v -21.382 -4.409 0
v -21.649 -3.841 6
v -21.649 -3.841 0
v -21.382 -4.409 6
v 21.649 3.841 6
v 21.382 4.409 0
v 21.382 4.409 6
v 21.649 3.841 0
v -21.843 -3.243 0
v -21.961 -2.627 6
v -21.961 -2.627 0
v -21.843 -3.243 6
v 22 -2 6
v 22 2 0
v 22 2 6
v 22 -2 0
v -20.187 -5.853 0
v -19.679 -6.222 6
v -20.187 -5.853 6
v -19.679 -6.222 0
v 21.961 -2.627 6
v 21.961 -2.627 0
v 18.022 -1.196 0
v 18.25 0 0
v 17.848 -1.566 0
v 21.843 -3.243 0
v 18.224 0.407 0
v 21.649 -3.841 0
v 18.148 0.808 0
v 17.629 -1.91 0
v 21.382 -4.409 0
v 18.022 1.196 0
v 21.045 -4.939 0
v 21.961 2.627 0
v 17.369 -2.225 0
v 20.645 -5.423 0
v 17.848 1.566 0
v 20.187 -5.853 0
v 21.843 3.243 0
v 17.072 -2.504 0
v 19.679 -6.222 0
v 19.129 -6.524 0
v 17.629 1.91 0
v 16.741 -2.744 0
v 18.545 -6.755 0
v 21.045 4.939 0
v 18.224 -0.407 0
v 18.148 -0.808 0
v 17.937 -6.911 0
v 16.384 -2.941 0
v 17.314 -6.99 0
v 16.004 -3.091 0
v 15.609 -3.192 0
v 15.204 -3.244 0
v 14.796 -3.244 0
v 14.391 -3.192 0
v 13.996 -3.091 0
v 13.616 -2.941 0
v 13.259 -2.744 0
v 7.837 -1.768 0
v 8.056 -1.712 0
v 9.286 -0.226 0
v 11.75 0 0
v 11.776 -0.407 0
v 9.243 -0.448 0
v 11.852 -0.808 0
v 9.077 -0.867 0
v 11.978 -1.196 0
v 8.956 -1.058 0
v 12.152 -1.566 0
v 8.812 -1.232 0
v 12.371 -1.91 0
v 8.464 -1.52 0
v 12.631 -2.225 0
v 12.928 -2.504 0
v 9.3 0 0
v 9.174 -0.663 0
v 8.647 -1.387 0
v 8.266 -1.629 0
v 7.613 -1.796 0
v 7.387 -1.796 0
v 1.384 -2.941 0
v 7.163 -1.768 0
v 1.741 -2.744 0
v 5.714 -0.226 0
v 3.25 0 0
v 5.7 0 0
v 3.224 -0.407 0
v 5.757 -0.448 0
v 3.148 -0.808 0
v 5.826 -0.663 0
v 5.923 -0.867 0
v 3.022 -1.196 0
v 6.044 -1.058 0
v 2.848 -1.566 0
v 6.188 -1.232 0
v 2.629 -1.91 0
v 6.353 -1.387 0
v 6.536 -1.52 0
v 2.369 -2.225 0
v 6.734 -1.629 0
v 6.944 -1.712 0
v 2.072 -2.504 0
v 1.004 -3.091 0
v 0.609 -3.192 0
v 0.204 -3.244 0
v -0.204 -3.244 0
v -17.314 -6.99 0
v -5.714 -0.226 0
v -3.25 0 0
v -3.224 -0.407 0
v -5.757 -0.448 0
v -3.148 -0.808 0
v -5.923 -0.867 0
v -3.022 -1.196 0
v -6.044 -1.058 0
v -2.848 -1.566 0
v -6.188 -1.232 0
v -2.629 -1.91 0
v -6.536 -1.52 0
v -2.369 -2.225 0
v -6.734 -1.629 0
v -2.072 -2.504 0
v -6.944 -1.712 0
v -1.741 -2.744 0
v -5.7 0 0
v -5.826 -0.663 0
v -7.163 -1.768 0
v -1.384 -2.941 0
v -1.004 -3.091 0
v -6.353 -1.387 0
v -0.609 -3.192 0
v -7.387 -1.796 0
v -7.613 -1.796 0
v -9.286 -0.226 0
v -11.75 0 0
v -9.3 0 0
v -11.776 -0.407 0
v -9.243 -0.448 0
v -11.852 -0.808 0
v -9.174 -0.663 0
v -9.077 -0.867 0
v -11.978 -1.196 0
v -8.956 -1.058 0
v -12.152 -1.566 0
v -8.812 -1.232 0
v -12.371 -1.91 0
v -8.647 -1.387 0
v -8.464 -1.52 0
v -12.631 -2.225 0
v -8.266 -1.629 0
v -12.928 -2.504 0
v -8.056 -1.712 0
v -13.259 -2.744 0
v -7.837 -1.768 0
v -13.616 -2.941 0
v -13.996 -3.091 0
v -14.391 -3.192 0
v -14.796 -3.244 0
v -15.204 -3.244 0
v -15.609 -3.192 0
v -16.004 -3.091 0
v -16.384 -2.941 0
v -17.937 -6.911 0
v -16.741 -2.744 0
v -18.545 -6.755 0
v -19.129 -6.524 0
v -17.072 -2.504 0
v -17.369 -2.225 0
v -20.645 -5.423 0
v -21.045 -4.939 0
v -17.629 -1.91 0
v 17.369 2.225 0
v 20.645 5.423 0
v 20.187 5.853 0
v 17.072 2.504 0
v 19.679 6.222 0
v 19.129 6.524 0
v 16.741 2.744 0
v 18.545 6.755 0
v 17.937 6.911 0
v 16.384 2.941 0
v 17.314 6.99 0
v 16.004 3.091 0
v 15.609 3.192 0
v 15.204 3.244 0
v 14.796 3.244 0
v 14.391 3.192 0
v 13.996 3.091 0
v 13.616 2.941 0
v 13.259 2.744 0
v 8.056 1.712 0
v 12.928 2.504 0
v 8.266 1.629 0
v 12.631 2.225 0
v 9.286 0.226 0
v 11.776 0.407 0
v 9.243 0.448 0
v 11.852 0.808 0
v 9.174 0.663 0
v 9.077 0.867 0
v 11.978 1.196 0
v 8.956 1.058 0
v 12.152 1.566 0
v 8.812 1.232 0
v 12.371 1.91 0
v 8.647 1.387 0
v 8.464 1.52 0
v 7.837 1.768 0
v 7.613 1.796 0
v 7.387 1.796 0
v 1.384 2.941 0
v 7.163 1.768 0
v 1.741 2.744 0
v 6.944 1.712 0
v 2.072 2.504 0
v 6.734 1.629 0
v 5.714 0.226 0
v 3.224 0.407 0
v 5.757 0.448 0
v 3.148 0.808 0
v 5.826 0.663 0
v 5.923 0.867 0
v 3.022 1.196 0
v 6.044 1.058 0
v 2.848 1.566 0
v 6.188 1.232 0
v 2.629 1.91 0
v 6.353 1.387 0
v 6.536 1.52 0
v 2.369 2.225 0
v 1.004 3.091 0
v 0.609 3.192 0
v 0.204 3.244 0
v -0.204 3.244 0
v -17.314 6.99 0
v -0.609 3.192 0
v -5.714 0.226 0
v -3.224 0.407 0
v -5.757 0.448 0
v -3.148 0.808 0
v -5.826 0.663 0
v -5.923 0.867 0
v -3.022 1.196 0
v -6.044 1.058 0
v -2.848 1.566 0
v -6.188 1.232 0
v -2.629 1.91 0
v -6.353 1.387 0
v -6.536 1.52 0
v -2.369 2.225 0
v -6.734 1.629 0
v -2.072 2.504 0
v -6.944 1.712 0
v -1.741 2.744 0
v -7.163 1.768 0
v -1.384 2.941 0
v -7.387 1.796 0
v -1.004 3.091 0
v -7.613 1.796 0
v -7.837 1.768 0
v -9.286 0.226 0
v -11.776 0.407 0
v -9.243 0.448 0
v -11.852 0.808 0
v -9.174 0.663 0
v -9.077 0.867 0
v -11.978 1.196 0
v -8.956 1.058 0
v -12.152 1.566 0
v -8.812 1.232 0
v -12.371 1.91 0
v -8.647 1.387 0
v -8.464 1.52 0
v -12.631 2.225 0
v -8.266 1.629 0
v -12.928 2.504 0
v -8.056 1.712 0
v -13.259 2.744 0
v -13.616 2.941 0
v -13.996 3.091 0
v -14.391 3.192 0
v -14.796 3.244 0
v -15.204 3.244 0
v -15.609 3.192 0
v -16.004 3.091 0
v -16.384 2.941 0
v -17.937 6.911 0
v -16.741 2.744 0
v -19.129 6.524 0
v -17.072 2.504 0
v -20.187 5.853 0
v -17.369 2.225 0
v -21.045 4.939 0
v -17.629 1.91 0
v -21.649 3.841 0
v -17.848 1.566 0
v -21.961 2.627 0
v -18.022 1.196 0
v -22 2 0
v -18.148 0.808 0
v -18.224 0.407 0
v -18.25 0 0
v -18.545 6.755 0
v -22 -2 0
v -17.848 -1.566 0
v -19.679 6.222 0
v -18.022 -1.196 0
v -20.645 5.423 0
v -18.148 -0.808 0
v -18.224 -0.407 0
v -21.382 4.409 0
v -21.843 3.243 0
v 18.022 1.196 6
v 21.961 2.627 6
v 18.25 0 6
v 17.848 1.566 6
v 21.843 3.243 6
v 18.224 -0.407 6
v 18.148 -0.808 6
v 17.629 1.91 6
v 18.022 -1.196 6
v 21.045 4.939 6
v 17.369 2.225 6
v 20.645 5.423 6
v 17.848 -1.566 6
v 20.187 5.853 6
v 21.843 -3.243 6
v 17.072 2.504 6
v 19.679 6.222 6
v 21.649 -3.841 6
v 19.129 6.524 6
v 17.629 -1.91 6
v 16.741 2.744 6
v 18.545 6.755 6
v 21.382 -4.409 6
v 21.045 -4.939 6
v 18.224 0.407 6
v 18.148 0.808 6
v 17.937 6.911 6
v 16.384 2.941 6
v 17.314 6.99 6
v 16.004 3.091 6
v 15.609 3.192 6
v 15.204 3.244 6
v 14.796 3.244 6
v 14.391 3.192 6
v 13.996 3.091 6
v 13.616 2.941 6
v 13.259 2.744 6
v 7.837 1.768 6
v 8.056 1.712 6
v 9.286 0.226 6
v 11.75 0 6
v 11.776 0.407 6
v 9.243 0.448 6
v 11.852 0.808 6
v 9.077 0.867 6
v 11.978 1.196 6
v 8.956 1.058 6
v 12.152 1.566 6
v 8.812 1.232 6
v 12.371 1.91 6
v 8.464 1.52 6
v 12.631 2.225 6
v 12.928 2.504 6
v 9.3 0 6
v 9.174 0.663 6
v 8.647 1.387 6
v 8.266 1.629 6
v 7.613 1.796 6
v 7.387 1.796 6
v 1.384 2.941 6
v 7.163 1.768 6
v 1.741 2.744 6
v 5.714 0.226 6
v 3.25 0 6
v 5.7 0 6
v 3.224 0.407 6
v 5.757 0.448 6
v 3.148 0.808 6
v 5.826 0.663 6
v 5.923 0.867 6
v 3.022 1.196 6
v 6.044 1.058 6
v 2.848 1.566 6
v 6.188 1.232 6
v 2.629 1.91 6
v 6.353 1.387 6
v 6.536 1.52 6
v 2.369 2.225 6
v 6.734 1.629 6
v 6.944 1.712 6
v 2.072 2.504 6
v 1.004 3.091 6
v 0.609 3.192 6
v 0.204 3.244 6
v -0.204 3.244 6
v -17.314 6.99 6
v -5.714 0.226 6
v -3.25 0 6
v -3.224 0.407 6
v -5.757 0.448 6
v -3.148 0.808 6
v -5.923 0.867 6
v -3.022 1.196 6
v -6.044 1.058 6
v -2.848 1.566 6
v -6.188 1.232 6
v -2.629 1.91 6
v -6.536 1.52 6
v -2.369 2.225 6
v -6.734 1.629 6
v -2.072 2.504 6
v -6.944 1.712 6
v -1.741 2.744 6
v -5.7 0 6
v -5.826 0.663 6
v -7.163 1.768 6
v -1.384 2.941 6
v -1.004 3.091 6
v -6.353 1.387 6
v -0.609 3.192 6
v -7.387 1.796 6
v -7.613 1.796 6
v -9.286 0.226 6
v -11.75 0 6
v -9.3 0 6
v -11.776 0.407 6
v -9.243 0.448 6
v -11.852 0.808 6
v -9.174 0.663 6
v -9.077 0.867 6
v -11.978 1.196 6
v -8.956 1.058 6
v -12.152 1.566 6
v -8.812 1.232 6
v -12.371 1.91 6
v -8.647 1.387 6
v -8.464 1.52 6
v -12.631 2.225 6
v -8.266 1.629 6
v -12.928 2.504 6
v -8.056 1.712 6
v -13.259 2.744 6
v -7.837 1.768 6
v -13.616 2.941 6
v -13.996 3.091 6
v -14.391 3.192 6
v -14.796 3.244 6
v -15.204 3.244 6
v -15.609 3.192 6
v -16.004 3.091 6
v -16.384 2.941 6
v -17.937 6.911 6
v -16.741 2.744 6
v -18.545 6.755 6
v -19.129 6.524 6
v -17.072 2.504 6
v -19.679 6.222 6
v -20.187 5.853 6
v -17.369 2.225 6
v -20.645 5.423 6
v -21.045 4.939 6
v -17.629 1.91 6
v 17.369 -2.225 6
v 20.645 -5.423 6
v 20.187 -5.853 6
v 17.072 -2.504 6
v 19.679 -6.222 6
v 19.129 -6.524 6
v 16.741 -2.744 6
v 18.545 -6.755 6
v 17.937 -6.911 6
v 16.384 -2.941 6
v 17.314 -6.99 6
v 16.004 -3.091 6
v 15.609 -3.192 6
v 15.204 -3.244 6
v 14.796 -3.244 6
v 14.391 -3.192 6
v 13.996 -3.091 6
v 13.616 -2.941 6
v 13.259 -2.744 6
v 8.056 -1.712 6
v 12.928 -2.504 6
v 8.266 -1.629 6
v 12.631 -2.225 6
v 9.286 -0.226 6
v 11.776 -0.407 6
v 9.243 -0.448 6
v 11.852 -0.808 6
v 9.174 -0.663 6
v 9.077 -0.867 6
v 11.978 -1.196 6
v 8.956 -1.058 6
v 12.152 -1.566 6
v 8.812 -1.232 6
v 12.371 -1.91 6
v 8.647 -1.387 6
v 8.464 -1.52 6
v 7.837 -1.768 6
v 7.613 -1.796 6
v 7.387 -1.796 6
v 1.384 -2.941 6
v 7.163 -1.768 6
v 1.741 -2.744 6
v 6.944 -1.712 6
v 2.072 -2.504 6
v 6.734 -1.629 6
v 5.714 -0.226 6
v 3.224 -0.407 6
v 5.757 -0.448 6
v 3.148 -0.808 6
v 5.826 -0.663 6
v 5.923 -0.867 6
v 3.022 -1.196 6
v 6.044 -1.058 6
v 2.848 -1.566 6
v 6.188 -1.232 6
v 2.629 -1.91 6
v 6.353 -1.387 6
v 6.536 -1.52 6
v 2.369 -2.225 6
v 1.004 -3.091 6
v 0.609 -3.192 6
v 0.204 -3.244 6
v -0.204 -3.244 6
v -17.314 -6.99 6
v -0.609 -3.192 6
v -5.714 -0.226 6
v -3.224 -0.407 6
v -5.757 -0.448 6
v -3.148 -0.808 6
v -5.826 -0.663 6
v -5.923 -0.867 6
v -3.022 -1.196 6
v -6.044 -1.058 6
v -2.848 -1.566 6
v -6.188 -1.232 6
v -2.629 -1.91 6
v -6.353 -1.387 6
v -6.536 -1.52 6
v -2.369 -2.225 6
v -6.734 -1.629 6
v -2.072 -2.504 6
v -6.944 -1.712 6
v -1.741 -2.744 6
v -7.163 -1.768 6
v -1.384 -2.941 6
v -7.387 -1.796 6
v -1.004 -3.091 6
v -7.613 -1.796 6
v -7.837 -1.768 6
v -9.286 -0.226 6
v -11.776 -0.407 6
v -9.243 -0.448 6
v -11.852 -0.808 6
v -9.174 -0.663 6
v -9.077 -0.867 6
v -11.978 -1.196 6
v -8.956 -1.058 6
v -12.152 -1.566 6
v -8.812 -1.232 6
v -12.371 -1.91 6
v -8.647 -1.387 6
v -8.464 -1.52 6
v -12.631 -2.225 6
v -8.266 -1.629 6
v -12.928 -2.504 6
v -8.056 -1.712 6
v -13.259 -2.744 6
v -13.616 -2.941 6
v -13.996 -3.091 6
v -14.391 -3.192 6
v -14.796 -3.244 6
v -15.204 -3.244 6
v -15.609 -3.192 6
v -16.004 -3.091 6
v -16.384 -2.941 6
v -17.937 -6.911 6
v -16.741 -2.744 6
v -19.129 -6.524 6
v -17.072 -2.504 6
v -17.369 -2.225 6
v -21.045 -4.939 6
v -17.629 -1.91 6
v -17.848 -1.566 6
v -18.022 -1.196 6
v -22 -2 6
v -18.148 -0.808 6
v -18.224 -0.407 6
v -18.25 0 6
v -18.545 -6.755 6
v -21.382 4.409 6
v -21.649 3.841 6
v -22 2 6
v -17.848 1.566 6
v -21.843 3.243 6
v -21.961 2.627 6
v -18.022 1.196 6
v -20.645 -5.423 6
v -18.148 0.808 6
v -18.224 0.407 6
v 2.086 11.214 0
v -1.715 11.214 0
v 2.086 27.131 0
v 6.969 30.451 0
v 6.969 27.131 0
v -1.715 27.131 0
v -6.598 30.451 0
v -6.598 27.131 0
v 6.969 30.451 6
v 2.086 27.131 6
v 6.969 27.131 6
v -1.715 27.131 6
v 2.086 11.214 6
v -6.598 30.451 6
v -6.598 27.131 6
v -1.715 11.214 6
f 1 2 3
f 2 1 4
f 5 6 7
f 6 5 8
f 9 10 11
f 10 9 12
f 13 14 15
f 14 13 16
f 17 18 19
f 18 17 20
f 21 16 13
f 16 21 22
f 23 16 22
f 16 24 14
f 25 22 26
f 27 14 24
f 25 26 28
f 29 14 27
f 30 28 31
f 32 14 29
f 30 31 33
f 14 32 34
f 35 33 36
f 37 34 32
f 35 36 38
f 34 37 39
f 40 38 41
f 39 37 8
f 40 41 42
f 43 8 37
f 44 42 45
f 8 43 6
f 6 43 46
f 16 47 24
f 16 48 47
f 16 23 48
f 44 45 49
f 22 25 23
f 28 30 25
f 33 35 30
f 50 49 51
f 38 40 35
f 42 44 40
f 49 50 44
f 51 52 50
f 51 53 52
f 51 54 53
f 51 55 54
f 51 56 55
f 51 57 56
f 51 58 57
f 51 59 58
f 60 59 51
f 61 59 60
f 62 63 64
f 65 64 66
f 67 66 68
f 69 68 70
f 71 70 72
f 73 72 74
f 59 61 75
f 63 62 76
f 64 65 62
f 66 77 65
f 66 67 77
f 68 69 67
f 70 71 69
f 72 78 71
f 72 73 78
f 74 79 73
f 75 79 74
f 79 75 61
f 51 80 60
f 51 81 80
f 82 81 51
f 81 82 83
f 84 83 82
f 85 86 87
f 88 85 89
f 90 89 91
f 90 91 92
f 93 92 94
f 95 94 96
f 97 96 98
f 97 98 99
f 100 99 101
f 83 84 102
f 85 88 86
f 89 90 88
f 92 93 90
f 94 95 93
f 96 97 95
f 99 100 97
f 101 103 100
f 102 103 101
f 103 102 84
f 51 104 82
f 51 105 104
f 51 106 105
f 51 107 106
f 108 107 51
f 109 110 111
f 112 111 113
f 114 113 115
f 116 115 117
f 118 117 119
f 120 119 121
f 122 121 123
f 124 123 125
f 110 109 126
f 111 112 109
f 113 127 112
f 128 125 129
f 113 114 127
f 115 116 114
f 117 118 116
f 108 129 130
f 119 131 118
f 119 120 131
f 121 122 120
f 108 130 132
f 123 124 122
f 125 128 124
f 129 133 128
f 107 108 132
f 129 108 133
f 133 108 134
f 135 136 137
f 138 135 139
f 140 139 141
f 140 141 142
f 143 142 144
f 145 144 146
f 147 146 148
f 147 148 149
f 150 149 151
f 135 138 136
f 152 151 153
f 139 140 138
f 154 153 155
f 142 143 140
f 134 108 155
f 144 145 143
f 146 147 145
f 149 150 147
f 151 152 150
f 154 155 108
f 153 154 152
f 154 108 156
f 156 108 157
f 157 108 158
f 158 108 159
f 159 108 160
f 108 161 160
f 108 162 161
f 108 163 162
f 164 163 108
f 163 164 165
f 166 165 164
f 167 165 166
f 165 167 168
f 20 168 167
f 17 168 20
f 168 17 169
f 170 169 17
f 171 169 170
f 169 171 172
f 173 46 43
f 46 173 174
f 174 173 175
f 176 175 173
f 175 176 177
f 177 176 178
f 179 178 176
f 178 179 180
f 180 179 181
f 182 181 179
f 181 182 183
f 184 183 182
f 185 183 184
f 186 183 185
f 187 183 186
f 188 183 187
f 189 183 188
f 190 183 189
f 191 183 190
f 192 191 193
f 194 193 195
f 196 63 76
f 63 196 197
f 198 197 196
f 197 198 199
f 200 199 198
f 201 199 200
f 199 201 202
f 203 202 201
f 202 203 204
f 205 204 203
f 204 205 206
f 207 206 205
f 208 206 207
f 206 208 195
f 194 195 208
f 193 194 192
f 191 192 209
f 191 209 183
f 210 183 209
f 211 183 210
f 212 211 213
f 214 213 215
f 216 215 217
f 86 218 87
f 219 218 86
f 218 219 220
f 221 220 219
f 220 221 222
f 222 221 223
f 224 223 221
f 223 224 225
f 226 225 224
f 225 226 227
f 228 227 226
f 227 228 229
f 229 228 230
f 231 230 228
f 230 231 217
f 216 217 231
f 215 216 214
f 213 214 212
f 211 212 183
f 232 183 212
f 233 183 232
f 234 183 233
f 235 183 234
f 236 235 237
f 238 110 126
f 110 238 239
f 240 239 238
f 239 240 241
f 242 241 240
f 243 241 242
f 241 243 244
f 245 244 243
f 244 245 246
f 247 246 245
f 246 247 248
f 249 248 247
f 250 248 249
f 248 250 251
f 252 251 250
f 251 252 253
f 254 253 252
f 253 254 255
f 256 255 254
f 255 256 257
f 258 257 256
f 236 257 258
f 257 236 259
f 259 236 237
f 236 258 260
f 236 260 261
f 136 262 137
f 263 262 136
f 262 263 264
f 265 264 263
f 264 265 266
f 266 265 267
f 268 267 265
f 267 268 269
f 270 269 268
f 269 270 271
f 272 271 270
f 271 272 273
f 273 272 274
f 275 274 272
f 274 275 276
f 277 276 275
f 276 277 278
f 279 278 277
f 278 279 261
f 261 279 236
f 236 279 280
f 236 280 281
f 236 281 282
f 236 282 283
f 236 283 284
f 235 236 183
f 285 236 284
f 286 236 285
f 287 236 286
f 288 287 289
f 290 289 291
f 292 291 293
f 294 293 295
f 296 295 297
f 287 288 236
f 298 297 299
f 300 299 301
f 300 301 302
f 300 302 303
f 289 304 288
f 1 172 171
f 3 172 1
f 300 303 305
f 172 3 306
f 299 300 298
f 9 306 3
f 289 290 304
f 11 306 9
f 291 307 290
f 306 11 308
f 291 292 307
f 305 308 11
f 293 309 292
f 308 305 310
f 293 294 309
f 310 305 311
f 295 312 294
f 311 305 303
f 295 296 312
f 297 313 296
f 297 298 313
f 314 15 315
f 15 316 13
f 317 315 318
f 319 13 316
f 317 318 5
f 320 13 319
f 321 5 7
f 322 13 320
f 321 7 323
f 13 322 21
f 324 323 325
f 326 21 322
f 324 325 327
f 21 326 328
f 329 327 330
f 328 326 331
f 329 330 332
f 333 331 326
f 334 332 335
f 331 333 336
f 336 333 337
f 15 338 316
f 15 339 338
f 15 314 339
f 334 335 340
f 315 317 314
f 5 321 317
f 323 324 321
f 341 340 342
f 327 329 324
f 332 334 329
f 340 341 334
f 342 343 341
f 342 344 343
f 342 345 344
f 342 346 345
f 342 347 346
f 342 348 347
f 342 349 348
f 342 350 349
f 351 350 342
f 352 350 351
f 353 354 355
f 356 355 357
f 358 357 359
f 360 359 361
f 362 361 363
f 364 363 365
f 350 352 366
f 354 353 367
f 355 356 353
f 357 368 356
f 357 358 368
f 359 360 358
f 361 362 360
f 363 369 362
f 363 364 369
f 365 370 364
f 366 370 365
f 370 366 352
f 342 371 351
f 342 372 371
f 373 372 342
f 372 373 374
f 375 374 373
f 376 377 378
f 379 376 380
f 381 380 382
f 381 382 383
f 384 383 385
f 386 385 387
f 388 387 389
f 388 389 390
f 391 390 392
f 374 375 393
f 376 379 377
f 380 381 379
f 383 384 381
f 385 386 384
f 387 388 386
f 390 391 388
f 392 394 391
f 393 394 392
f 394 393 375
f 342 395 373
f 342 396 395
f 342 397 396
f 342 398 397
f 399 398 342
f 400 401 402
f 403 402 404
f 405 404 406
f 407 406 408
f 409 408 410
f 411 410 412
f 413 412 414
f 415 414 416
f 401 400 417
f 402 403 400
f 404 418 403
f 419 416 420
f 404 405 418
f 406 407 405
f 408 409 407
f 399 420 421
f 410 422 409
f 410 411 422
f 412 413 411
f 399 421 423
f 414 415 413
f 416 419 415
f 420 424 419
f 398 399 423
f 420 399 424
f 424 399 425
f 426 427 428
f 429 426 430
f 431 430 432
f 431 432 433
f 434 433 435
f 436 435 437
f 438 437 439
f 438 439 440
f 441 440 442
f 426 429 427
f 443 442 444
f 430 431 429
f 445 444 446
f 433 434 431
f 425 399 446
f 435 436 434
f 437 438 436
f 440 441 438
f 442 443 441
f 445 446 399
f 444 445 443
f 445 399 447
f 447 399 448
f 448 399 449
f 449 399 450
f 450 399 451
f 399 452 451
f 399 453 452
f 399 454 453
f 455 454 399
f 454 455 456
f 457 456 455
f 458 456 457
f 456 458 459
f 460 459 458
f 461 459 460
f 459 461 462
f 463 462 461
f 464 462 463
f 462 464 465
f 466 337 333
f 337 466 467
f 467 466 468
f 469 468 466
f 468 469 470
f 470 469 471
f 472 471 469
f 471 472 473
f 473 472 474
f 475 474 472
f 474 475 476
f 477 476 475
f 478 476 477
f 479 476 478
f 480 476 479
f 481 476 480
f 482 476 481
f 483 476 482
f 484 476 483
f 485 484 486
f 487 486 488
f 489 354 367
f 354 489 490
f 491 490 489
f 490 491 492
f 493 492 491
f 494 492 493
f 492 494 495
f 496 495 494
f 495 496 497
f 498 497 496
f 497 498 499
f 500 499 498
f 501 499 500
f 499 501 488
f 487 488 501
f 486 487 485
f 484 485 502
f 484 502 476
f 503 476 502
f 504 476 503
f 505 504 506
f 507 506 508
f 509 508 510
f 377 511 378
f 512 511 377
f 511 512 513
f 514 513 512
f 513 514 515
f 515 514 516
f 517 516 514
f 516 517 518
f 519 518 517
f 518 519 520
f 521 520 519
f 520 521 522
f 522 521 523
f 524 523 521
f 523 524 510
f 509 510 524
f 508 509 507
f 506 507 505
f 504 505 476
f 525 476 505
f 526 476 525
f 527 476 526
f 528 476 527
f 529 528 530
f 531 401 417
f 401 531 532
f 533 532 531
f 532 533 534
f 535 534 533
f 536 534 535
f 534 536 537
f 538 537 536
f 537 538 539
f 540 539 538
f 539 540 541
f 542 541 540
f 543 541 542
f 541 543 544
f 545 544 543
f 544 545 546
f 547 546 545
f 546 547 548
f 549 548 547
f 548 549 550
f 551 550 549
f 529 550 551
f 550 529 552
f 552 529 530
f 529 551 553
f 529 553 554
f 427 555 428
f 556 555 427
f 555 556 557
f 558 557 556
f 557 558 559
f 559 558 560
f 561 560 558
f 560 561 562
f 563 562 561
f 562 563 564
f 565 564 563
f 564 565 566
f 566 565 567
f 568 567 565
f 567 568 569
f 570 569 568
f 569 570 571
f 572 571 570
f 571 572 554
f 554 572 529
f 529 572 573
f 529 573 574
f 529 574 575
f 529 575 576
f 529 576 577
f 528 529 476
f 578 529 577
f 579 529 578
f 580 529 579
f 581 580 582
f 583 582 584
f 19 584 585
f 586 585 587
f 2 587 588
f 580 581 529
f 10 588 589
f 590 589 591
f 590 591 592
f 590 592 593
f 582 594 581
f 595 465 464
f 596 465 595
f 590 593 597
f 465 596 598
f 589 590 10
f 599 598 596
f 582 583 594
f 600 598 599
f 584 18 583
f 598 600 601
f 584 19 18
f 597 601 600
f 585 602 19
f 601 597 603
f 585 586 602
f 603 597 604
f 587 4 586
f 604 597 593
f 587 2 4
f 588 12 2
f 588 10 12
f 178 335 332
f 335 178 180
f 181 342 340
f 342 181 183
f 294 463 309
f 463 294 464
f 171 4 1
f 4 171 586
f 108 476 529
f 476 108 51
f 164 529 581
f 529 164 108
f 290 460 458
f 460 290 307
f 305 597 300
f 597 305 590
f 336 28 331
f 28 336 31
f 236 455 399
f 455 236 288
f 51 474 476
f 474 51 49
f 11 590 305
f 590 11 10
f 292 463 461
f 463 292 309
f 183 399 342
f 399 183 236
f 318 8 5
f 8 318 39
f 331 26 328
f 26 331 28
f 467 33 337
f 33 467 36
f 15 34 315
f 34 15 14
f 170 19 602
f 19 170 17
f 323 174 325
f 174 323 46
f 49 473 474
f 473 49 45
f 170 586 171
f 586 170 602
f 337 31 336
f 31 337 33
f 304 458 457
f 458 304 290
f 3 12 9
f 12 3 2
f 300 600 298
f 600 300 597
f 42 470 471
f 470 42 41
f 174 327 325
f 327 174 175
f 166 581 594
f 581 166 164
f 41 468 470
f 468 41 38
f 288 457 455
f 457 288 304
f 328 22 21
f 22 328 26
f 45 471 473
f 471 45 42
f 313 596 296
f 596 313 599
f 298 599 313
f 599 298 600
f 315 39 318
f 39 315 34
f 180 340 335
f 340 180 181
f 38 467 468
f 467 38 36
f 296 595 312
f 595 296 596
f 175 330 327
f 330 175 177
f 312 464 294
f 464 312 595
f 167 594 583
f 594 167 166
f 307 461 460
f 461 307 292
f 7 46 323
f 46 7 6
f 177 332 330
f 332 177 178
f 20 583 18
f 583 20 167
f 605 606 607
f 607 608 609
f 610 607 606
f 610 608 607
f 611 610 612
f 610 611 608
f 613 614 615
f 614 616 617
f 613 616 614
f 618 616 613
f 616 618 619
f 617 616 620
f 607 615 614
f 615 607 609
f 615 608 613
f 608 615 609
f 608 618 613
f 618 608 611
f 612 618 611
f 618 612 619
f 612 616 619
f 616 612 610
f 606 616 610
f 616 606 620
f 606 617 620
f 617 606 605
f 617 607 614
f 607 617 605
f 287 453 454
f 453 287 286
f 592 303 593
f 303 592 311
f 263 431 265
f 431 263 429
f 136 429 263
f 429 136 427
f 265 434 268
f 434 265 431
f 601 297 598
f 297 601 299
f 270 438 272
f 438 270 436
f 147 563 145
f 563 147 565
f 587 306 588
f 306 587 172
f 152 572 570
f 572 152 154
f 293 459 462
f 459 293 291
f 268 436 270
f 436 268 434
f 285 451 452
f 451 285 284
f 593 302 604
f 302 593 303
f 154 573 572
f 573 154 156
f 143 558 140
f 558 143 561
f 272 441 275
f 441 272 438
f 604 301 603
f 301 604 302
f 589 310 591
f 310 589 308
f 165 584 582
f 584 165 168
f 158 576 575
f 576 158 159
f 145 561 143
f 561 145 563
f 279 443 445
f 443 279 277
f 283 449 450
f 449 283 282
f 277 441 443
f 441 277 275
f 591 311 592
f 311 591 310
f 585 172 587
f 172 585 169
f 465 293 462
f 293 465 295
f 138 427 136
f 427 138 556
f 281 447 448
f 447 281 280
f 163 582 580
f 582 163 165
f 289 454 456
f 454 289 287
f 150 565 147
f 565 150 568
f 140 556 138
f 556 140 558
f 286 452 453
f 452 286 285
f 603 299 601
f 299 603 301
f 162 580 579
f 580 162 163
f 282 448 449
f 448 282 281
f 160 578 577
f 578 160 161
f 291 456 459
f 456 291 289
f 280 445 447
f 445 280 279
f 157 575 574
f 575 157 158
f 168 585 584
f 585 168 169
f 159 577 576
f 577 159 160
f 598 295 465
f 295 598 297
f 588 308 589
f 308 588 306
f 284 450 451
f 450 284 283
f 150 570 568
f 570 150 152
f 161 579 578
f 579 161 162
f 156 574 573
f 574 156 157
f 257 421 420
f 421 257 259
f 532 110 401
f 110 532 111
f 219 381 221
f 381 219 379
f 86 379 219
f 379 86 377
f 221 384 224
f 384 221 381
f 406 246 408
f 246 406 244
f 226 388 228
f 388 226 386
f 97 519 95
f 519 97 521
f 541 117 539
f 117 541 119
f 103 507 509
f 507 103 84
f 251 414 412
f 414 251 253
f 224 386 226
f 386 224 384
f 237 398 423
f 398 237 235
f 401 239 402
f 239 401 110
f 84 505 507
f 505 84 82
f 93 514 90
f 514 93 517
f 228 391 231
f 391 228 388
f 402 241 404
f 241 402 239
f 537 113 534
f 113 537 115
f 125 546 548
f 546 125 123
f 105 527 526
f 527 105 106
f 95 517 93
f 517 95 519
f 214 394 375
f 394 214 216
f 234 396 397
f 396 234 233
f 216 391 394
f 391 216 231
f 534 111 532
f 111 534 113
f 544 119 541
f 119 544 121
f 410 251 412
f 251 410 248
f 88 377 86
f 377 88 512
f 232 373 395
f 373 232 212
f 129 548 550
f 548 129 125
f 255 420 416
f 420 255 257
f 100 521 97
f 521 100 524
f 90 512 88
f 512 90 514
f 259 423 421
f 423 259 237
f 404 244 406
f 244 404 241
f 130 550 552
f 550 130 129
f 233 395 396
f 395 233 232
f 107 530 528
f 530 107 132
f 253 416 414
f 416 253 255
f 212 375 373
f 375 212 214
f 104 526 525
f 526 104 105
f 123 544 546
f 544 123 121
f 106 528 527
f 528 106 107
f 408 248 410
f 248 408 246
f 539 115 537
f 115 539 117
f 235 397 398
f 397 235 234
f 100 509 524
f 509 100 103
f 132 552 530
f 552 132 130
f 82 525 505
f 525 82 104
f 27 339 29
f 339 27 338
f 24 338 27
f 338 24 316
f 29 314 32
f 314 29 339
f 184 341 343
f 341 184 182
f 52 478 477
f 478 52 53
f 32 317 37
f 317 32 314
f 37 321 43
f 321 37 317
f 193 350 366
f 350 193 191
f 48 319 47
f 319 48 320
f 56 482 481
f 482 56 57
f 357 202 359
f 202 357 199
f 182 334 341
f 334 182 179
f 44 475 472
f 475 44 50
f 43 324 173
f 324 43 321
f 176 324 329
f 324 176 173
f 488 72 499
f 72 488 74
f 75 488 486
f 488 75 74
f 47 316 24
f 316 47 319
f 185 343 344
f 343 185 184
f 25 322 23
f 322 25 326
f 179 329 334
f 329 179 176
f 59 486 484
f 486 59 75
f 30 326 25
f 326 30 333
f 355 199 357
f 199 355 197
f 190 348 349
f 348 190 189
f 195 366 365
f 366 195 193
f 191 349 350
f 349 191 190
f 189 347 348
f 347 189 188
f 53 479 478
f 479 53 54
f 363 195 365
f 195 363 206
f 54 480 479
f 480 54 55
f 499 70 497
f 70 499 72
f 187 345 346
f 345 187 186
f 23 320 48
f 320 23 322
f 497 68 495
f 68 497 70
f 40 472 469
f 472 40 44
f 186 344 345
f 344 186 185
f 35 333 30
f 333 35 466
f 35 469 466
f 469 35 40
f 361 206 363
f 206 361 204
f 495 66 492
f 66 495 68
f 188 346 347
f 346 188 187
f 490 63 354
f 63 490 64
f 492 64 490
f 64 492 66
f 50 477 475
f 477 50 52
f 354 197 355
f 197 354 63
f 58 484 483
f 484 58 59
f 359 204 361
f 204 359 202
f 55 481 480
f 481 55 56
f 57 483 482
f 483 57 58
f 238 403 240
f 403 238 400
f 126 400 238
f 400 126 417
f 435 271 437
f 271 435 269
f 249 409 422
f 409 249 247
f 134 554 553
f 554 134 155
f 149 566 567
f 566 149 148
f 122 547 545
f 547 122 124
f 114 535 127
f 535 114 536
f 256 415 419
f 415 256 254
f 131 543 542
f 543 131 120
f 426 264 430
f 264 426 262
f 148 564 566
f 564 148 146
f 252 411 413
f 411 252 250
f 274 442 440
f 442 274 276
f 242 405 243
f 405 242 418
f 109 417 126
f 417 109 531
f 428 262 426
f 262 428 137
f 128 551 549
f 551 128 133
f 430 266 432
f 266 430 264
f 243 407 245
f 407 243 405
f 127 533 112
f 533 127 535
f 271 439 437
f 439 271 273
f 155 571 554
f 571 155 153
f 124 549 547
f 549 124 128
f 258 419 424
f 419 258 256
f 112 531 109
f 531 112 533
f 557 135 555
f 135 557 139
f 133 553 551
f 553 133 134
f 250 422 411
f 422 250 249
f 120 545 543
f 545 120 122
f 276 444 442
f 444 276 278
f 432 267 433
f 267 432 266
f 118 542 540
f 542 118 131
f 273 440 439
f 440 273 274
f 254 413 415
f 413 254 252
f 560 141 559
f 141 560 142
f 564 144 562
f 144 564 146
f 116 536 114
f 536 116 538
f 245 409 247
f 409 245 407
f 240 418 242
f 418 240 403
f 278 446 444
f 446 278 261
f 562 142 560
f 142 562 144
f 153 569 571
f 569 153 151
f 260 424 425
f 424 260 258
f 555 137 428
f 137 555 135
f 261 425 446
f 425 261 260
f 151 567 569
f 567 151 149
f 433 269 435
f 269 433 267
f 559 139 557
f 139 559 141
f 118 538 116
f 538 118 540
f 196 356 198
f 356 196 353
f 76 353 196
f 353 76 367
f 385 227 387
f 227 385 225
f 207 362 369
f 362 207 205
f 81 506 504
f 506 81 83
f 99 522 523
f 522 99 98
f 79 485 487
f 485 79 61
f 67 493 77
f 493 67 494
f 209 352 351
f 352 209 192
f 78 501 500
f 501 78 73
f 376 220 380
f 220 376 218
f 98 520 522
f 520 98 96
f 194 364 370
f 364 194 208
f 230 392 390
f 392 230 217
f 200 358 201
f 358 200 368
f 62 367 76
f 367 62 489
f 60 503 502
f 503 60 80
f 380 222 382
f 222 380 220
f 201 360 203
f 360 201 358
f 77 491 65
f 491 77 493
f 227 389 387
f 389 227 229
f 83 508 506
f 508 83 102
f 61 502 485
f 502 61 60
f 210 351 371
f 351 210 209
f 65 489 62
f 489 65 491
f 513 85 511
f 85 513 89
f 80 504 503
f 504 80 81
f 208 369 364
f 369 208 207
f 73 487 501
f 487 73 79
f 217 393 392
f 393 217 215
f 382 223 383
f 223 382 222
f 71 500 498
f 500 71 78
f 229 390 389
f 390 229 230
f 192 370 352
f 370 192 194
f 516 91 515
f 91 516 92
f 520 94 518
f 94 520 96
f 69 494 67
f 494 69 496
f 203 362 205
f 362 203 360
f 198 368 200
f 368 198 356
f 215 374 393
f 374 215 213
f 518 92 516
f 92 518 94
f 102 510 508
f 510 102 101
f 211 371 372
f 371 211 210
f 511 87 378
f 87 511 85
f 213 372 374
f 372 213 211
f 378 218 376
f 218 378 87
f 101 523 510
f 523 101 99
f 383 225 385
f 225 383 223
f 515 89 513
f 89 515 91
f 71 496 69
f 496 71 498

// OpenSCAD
$fn = 50;


difference() {
	union() {
		hull() {
			translate(v = [-17.0000000000, 2.0000000000, 0]) {
				cylinder(h = 6, r = 5);
			}
			translate(v = [17.0000000000, 2.0000000000, 0]) {
				cylinder(h = 6, r = 5);
			}
			translate(v = [-17.0000000000, -2.0000000000, 0]) {
				cylinder(h = 6, r = 5);
			}
			translate(v = [17.0000000000, -2.0000000000, 0]) {
				cylinder(h = 6, r = 5);
			}
		}
		translate(v = [0, 30.0000000000, 0]) {
			linear_extrude(height = 6) {
				text(font = "DejaVu Sans Mono:style=Bold", halign = "center", size = 19.0000000000, text = "T", valign = "top");
			}
		}
	}
	union() {
		translate(v = [-15.0000000000, 0.0000000000, 0]) {
			translate(v = [0, 0, -100]) {
				cylinder(h = 200, r = 3.2500000000);
			}
		}
		translate(v = [0, 0, -100]) {
			cylinder(h = 200, r = 3.2500000000);
		}
		translate(v = [15.0000000000, 0.0000000000, 0]) {
			translate(v = [0, 0, -100]) {
				cylinder(h = 200, r = 3.2500000000);
			}
		}
		translate(v = [-15.0000000000, 0.0000000000, 0]) {
			translate(v = [0, 0, -100]) {
				cylinder(h = 200, r = 1.8000000000);
			}
		}
		translate(v = [-7.5000000000, 0.0000000000, 0]) {
			translate(v = [0, 0, -100]) {
				cylinder(h = 200, r = 1.8000000000);
			}
		}
		translate(v = [0, 0, -100]) {
			cylinder(h = 200, r = 1.8000000000);
		}
		translate(v = [7.5000000000, 0.0000000000, 0]) {
			translate(v = [0, 0, -100]) {
				cylinder(h = 200, r = 1.8000000000);
			}
		}
		translate(v = [15.0000000000, 0.0000000000, 0]) {
			translate(v = [0, 0, -100]) {
				cylinder(h = 200, r = 1.8000000000);
			}
		}
	}
}
